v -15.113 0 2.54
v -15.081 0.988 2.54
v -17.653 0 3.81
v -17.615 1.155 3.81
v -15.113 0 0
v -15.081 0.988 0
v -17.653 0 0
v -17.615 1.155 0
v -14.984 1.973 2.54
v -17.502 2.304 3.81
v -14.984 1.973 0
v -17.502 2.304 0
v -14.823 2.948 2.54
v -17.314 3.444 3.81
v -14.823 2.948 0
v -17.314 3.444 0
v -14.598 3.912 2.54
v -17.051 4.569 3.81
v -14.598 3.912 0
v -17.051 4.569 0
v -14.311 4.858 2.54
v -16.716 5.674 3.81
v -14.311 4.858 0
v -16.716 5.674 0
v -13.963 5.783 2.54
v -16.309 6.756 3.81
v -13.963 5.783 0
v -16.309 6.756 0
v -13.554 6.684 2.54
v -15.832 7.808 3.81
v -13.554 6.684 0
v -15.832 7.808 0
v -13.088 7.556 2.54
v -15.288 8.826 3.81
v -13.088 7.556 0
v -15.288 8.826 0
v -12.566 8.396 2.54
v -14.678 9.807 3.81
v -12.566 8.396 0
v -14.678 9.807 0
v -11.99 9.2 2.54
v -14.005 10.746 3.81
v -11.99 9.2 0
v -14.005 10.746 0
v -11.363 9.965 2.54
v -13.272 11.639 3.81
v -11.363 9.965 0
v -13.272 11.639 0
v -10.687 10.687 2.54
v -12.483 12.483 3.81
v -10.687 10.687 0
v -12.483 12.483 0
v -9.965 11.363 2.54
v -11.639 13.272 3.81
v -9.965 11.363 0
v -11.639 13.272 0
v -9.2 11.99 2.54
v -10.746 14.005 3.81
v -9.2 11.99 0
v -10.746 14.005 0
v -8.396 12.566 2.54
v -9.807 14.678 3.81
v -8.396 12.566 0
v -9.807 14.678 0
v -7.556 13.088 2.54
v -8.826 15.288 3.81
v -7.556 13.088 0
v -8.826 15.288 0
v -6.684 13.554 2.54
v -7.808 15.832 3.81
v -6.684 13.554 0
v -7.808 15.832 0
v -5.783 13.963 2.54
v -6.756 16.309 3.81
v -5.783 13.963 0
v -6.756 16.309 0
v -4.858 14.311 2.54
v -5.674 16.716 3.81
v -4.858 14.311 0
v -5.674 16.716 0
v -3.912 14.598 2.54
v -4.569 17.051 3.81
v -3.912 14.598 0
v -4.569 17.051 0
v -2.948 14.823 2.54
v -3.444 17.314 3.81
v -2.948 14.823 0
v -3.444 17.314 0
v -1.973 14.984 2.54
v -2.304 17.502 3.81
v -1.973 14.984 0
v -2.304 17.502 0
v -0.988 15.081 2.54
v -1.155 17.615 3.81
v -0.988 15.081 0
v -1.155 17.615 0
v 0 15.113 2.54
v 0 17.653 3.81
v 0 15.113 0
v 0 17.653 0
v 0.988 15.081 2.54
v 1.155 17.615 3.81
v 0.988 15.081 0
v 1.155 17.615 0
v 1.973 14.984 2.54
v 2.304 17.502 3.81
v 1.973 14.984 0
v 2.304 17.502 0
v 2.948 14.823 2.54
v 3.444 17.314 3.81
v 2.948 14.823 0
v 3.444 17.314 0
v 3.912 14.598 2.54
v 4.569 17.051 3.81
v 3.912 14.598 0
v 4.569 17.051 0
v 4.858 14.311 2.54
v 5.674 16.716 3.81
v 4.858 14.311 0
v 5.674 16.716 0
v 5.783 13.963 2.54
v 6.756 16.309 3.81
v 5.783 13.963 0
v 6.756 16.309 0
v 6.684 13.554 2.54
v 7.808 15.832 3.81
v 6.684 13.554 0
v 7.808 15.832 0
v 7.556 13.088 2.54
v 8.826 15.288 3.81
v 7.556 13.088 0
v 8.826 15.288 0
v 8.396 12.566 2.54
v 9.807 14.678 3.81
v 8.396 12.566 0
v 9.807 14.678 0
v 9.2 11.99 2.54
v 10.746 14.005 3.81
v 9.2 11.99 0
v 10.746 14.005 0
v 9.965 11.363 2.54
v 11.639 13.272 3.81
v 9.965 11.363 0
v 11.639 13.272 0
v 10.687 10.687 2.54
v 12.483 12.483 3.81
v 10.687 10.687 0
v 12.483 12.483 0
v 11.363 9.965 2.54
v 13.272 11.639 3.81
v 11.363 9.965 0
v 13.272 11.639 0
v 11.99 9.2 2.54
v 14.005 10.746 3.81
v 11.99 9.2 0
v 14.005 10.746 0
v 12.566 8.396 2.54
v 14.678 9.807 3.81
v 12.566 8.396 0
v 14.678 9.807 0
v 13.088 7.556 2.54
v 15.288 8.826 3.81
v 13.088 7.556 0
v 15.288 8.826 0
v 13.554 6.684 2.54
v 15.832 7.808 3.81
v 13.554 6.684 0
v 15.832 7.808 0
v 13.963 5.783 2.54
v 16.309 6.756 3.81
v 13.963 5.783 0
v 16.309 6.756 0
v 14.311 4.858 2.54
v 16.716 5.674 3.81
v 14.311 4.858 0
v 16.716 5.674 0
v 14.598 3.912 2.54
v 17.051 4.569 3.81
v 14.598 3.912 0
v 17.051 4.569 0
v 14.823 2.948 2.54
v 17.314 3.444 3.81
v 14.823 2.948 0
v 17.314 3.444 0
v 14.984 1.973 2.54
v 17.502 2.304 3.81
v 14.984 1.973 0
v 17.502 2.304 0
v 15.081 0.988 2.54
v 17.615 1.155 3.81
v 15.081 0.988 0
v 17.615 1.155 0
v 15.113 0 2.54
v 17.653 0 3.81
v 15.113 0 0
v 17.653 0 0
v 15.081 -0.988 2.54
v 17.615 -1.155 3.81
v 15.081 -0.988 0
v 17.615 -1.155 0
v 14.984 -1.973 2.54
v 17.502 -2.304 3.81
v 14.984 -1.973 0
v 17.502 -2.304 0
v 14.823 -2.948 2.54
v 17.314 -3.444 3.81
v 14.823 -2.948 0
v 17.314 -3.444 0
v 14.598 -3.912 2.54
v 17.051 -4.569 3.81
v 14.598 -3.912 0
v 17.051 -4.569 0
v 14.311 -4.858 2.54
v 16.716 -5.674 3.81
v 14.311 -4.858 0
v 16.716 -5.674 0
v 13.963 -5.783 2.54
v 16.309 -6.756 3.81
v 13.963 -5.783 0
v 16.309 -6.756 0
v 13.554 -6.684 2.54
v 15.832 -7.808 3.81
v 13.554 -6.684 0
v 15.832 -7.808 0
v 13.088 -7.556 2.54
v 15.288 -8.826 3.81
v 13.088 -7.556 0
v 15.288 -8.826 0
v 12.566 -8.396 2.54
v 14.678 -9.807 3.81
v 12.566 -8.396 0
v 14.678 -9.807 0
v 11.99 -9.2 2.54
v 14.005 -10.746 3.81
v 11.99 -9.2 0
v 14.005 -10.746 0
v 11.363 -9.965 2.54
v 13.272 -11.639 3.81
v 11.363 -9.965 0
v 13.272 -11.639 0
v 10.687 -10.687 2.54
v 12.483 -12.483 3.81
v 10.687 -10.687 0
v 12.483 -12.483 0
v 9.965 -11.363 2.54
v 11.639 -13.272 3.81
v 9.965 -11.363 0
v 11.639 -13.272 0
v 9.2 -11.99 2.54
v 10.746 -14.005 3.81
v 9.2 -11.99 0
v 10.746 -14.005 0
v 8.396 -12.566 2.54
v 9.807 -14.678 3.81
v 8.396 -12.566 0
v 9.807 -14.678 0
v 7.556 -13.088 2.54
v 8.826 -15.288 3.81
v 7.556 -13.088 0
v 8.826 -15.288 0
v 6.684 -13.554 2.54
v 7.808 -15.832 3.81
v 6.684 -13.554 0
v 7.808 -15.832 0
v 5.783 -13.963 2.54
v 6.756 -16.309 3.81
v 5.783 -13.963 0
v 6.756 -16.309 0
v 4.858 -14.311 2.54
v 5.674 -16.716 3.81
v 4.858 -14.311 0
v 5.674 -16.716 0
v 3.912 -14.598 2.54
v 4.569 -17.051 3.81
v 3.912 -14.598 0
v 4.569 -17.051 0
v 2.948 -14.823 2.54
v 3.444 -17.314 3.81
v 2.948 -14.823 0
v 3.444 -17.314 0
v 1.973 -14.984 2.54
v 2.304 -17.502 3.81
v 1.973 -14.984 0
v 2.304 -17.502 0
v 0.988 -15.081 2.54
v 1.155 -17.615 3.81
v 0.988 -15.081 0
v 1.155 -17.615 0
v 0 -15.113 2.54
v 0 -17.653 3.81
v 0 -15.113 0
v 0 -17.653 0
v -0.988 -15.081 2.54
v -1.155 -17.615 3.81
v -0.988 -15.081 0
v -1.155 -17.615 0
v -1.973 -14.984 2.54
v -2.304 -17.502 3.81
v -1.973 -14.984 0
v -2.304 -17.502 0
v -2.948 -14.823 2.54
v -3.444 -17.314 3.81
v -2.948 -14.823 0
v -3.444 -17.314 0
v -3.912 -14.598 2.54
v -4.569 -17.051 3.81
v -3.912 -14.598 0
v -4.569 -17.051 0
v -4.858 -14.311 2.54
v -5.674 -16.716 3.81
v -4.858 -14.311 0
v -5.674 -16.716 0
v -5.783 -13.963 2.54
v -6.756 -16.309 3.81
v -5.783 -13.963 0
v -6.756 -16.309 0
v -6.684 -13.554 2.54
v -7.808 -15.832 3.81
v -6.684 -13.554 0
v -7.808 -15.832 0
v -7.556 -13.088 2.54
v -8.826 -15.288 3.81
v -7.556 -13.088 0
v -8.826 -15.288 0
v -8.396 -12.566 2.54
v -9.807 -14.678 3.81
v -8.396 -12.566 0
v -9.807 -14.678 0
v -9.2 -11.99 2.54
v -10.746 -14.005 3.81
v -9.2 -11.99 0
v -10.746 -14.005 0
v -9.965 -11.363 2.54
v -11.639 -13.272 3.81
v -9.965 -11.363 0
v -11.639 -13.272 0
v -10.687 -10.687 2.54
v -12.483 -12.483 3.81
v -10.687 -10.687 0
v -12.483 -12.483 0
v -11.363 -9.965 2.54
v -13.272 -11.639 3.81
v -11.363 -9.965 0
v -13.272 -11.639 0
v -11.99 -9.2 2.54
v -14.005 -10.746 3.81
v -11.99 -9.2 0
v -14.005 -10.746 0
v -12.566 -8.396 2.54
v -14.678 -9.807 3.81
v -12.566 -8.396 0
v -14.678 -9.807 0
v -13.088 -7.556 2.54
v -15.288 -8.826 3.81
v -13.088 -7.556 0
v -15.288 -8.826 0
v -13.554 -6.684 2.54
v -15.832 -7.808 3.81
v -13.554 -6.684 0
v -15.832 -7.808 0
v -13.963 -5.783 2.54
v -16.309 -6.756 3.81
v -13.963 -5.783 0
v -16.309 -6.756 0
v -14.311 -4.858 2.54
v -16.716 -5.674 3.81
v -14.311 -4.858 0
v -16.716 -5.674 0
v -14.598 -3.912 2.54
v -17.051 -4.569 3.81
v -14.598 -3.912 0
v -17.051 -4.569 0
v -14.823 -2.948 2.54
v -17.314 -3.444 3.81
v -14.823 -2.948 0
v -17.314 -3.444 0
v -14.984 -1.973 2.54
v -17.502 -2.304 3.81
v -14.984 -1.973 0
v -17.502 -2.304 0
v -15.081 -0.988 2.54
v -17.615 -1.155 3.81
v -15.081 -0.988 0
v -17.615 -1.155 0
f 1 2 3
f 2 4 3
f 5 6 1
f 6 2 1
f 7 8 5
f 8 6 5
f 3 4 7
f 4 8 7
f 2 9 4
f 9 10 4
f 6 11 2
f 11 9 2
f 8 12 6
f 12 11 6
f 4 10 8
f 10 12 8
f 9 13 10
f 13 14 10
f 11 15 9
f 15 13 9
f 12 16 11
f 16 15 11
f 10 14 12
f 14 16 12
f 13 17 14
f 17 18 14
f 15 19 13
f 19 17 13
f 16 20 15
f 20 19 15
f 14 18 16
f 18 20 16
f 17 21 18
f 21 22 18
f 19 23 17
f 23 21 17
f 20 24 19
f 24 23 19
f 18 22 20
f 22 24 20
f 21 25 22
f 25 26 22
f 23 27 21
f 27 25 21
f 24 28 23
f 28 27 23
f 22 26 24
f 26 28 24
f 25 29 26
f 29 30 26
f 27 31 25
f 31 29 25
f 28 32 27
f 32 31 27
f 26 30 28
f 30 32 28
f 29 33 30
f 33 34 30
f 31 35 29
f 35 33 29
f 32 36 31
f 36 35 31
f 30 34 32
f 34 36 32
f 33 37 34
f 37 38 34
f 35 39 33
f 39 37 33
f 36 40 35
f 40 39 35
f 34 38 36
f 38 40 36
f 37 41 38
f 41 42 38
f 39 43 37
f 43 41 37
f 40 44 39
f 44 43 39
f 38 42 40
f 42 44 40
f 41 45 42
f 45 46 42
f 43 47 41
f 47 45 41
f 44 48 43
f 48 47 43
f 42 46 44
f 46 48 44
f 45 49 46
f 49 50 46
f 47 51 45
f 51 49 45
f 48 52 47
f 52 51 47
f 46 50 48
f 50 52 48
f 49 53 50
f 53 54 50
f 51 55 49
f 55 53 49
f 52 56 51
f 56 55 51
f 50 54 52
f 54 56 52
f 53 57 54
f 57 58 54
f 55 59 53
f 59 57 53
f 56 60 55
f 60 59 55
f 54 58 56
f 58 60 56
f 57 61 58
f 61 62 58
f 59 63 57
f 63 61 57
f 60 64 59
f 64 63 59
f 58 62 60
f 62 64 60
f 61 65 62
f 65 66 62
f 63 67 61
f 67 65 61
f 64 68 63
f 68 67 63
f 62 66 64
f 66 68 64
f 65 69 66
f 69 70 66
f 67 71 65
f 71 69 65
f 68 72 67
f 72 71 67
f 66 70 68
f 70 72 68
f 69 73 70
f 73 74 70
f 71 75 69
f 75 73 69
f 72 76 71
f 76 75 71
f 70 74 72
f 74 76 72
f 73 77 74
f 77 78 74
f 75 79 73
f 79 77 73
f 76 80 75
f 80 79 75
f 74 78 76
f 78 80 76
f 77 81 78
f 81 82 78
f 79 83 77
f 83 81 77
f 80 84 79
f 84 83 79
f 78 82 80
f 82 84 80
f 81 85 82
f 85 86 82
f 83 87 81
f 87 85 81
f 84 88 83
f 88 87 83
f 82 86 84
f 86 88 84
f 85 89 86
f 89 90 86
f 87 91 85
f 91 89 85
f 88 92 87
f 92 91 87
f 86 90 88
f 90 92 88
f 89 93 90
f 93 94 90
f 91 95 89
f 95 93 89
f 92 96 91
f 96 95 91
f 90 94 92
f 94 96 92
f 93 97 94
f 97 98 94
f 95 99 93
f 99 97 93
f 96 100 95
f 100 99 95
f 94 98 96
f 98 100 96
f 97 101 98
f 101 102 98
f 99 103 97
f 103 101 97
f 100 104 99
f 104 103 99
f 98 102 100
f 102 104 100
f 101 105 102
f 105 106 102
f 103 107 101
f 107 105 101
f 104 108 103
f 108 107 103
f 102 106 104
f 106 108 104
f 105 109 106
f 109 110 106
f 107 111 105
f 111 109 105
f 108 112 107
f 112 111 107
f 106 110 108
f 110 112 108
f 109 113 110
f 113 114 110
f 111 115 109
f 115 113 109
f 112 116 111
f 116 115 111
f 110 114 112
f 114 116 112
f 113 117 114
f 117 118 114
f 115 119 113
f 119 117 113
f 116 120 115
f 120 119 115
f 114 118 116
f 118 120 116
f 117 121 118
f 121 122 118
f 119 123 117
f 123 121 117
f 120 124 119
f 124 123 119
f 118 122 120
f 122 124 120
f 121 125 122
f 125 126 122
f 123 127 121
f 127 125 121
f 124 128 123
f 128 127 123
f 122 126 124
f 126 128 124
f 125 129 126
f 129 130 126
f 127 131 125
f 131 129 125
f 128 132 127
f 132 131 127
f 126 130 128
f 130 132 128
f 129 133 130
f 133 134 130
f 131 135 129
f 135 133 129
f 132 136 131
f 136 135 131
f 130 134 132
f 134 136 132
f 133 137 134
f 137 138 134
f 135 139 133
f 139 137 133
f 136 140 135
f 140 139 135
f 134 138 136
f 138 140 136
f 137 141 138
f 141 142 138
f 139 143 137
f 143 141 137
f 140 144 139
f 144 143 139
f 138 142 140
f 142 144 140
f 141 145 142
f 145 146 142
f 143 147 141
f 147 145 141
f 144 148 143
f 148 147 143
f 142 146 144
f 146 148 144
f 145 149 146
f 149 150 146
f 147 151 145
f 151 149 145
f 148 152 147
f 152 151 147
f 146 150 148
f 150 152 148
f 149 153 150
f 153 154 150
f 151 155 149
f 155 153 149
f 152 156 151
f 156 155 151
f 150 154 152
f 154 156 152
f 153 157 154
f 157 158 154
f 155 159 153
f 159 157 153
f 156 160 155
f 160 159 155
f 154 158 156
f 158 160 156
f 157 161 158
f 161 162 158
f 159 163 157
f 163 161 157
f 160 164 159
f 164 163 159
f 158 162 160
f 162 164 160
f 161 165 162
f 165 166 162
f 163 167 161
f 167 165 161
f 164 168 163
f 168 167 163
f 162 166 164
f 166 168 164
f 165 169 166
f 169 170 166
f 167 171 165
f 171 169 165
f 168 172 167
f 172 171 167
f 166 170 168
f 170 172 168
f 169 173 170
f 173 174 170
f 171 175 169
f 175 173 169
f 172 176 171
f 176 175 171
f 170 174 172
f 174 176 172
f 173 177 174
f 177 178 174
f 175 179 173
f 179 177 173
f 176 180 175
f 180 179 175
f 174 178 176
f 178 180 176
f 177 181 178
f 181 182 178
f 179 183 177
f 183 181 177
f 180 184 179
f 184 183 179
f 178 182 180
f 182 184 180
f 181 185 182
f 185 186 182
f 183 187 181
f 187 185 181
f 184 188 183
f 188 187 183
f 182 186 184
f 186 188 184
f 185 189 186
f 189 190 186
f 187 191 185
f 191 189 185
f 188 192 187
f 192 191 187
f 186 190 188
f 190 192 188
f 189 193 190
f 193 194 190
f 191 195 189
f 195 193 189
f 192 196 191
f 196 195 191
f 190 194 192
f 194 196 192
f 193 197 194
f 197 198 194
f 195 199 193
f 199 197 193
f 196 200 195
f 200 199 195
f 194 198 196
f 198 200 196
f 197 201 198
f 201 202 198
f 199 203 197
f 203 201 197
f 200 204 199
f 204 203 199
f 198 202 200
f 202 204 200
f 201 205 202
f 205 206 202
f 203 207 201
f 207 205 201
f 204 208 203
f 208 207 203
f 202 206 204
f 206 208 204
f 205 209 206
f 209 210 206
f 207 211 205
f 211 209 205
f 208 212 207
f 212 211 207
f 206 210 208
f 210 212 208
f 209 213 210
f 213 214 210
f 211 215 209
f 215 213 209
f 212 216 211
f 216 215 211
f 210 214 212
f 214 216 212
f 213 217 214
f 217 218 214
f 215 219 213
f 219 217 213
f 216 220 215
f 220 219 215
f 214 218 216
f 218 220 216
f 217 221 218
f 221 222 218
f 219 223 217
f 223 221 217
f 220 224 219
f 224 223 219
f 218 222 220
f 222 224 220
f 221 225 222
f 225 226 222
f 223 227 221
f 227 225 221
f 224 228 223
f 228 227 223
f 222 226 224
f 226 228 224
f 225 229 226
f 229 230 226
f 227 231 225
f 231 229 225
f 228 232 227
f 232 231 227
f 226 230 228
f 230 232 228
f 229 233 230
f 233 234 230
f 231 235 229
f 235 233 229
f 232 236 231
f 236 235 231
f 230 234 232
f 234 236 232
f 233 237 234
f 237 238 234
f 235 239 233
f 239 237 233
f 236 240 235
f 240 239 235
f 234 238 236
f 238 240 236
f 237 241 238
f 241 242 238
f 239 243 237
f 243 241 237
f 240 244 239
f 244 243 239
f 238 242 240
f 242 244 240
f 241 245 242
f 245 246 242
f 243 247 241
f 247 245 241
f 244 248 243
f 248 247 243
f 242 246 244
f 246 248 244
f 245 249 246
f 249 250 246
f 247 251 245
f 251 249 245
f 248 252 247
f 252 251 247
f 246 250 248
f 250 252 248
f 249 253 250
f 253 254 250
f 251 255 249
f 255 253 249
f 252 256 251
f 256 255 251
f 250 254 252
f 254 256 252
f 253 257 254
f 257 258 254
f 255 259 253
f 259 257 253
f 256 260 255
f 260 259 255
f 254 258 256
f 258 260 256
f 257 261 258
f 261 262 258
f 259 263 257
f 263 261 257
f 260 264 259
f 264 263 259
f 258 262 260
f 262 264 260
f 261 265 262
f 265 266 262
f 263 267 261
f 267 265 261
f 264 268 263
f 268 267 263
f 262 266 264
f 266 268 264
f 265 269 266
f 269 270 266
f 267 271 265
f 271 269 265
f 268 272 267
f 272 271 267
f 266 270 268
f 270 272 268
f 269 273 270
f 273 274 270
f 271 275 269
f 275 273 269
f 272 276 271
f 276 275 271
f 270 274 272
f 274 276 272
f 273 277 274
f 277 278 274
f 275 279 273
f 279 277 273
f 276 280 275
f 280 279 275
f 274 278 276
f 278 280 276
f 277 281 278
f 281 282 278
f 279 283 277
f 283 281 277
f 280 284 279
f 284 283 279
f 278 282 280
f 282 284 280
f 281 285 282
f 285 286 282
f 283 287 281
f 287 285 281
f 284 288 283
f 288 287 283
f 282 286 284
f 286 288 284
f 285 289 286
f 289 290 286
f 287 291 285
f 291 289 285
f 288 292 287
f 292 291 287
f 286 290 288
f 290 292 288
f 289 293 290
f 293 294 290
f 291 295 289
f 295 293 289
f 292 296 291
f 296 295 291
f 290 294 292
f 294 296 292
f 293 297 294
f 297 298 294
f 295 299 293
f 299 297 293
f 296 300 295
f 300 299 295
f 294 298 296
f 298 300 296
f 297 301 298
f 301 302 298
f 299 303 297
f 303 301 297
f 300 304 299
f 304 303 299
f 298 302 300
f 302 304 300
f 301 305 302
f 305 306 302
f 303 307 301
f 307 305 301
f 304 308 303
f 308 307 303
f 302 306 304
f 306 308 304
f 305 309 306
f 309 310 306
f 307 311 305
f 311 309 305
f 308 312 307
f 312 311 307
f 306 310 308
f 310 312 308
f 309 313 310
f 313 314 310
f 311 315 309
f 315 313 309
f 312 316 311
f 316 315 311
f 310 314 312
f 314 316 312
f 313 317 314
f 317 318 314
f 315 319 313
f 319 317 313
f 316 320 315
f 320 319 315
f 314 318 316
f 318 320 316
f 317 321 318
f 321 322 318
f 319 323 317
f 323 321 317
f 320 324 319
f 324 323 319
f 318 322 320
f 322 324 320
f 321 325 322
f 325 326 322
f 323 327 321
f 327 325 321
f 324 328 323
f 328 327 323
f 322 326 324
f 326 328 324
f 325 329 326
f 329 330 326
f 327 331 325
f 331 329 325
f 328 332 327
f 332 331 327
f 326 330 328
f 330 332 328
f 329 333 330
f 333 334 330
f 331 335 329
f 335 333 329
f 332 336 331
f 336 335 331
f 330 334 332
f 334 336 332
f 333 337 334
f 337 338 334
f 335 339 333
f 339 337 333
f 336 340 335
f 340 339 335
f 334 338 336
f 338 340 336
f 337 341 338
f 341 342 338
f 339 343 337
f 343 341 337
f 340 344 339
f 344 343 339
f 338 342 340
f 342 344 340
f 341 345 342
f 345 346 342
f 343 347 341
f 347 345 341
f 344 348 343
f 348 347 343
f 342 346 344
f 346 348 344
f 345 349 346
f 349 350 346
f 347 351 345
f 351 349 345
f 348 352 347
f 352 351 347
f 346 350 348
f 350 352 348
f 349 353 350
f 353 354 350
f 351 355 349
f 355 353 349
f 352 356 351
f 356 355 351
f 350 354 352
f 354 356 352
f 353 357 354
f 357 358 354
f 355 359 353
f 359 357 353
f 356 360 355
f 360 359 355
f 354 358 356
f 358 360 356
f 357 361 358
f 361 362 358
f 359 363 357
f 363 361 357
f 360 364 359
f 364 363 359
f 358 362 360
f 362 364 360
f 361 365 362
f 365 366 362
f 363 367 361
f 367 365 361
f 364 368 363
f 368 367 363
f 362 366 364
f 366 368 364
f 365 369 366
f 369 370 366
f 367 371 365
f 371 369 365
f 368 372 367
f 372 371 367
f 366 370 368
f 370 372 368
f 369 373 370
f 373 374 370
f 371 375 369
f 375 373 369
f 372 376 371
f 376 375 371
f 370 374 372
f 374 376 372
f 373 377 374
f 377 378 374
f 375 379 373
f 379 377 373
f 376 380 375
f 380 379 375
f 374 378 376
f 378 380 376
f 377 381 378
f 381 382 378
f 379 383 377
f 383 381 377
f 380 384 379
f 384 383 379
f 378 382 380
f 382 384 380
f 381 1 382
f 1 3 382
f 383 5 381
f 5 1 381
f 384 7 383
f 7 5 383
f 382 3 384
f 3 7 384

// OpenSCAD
ViewScale = [0.0254, 0.0254, 0.0254];

module ring0()
{
    difference() {
        circle(1390/2, $fn=96);
        circle(1290/2, $fn=96);
    }
}

module ring()
{
    rotate_extrude(angle=360, $fn=96)
    translate([1190/2, 0, 0])
    polygon([[0,0], [0,100], [100,150], [100,0]]);
}

module forViewing()
{
//    translate([0, 0, -50])
 //   ring0();
    color("green")
    ring();
}

module forPrinting()
{
}

scale(ViewScale)
{
    forViewing();
}
